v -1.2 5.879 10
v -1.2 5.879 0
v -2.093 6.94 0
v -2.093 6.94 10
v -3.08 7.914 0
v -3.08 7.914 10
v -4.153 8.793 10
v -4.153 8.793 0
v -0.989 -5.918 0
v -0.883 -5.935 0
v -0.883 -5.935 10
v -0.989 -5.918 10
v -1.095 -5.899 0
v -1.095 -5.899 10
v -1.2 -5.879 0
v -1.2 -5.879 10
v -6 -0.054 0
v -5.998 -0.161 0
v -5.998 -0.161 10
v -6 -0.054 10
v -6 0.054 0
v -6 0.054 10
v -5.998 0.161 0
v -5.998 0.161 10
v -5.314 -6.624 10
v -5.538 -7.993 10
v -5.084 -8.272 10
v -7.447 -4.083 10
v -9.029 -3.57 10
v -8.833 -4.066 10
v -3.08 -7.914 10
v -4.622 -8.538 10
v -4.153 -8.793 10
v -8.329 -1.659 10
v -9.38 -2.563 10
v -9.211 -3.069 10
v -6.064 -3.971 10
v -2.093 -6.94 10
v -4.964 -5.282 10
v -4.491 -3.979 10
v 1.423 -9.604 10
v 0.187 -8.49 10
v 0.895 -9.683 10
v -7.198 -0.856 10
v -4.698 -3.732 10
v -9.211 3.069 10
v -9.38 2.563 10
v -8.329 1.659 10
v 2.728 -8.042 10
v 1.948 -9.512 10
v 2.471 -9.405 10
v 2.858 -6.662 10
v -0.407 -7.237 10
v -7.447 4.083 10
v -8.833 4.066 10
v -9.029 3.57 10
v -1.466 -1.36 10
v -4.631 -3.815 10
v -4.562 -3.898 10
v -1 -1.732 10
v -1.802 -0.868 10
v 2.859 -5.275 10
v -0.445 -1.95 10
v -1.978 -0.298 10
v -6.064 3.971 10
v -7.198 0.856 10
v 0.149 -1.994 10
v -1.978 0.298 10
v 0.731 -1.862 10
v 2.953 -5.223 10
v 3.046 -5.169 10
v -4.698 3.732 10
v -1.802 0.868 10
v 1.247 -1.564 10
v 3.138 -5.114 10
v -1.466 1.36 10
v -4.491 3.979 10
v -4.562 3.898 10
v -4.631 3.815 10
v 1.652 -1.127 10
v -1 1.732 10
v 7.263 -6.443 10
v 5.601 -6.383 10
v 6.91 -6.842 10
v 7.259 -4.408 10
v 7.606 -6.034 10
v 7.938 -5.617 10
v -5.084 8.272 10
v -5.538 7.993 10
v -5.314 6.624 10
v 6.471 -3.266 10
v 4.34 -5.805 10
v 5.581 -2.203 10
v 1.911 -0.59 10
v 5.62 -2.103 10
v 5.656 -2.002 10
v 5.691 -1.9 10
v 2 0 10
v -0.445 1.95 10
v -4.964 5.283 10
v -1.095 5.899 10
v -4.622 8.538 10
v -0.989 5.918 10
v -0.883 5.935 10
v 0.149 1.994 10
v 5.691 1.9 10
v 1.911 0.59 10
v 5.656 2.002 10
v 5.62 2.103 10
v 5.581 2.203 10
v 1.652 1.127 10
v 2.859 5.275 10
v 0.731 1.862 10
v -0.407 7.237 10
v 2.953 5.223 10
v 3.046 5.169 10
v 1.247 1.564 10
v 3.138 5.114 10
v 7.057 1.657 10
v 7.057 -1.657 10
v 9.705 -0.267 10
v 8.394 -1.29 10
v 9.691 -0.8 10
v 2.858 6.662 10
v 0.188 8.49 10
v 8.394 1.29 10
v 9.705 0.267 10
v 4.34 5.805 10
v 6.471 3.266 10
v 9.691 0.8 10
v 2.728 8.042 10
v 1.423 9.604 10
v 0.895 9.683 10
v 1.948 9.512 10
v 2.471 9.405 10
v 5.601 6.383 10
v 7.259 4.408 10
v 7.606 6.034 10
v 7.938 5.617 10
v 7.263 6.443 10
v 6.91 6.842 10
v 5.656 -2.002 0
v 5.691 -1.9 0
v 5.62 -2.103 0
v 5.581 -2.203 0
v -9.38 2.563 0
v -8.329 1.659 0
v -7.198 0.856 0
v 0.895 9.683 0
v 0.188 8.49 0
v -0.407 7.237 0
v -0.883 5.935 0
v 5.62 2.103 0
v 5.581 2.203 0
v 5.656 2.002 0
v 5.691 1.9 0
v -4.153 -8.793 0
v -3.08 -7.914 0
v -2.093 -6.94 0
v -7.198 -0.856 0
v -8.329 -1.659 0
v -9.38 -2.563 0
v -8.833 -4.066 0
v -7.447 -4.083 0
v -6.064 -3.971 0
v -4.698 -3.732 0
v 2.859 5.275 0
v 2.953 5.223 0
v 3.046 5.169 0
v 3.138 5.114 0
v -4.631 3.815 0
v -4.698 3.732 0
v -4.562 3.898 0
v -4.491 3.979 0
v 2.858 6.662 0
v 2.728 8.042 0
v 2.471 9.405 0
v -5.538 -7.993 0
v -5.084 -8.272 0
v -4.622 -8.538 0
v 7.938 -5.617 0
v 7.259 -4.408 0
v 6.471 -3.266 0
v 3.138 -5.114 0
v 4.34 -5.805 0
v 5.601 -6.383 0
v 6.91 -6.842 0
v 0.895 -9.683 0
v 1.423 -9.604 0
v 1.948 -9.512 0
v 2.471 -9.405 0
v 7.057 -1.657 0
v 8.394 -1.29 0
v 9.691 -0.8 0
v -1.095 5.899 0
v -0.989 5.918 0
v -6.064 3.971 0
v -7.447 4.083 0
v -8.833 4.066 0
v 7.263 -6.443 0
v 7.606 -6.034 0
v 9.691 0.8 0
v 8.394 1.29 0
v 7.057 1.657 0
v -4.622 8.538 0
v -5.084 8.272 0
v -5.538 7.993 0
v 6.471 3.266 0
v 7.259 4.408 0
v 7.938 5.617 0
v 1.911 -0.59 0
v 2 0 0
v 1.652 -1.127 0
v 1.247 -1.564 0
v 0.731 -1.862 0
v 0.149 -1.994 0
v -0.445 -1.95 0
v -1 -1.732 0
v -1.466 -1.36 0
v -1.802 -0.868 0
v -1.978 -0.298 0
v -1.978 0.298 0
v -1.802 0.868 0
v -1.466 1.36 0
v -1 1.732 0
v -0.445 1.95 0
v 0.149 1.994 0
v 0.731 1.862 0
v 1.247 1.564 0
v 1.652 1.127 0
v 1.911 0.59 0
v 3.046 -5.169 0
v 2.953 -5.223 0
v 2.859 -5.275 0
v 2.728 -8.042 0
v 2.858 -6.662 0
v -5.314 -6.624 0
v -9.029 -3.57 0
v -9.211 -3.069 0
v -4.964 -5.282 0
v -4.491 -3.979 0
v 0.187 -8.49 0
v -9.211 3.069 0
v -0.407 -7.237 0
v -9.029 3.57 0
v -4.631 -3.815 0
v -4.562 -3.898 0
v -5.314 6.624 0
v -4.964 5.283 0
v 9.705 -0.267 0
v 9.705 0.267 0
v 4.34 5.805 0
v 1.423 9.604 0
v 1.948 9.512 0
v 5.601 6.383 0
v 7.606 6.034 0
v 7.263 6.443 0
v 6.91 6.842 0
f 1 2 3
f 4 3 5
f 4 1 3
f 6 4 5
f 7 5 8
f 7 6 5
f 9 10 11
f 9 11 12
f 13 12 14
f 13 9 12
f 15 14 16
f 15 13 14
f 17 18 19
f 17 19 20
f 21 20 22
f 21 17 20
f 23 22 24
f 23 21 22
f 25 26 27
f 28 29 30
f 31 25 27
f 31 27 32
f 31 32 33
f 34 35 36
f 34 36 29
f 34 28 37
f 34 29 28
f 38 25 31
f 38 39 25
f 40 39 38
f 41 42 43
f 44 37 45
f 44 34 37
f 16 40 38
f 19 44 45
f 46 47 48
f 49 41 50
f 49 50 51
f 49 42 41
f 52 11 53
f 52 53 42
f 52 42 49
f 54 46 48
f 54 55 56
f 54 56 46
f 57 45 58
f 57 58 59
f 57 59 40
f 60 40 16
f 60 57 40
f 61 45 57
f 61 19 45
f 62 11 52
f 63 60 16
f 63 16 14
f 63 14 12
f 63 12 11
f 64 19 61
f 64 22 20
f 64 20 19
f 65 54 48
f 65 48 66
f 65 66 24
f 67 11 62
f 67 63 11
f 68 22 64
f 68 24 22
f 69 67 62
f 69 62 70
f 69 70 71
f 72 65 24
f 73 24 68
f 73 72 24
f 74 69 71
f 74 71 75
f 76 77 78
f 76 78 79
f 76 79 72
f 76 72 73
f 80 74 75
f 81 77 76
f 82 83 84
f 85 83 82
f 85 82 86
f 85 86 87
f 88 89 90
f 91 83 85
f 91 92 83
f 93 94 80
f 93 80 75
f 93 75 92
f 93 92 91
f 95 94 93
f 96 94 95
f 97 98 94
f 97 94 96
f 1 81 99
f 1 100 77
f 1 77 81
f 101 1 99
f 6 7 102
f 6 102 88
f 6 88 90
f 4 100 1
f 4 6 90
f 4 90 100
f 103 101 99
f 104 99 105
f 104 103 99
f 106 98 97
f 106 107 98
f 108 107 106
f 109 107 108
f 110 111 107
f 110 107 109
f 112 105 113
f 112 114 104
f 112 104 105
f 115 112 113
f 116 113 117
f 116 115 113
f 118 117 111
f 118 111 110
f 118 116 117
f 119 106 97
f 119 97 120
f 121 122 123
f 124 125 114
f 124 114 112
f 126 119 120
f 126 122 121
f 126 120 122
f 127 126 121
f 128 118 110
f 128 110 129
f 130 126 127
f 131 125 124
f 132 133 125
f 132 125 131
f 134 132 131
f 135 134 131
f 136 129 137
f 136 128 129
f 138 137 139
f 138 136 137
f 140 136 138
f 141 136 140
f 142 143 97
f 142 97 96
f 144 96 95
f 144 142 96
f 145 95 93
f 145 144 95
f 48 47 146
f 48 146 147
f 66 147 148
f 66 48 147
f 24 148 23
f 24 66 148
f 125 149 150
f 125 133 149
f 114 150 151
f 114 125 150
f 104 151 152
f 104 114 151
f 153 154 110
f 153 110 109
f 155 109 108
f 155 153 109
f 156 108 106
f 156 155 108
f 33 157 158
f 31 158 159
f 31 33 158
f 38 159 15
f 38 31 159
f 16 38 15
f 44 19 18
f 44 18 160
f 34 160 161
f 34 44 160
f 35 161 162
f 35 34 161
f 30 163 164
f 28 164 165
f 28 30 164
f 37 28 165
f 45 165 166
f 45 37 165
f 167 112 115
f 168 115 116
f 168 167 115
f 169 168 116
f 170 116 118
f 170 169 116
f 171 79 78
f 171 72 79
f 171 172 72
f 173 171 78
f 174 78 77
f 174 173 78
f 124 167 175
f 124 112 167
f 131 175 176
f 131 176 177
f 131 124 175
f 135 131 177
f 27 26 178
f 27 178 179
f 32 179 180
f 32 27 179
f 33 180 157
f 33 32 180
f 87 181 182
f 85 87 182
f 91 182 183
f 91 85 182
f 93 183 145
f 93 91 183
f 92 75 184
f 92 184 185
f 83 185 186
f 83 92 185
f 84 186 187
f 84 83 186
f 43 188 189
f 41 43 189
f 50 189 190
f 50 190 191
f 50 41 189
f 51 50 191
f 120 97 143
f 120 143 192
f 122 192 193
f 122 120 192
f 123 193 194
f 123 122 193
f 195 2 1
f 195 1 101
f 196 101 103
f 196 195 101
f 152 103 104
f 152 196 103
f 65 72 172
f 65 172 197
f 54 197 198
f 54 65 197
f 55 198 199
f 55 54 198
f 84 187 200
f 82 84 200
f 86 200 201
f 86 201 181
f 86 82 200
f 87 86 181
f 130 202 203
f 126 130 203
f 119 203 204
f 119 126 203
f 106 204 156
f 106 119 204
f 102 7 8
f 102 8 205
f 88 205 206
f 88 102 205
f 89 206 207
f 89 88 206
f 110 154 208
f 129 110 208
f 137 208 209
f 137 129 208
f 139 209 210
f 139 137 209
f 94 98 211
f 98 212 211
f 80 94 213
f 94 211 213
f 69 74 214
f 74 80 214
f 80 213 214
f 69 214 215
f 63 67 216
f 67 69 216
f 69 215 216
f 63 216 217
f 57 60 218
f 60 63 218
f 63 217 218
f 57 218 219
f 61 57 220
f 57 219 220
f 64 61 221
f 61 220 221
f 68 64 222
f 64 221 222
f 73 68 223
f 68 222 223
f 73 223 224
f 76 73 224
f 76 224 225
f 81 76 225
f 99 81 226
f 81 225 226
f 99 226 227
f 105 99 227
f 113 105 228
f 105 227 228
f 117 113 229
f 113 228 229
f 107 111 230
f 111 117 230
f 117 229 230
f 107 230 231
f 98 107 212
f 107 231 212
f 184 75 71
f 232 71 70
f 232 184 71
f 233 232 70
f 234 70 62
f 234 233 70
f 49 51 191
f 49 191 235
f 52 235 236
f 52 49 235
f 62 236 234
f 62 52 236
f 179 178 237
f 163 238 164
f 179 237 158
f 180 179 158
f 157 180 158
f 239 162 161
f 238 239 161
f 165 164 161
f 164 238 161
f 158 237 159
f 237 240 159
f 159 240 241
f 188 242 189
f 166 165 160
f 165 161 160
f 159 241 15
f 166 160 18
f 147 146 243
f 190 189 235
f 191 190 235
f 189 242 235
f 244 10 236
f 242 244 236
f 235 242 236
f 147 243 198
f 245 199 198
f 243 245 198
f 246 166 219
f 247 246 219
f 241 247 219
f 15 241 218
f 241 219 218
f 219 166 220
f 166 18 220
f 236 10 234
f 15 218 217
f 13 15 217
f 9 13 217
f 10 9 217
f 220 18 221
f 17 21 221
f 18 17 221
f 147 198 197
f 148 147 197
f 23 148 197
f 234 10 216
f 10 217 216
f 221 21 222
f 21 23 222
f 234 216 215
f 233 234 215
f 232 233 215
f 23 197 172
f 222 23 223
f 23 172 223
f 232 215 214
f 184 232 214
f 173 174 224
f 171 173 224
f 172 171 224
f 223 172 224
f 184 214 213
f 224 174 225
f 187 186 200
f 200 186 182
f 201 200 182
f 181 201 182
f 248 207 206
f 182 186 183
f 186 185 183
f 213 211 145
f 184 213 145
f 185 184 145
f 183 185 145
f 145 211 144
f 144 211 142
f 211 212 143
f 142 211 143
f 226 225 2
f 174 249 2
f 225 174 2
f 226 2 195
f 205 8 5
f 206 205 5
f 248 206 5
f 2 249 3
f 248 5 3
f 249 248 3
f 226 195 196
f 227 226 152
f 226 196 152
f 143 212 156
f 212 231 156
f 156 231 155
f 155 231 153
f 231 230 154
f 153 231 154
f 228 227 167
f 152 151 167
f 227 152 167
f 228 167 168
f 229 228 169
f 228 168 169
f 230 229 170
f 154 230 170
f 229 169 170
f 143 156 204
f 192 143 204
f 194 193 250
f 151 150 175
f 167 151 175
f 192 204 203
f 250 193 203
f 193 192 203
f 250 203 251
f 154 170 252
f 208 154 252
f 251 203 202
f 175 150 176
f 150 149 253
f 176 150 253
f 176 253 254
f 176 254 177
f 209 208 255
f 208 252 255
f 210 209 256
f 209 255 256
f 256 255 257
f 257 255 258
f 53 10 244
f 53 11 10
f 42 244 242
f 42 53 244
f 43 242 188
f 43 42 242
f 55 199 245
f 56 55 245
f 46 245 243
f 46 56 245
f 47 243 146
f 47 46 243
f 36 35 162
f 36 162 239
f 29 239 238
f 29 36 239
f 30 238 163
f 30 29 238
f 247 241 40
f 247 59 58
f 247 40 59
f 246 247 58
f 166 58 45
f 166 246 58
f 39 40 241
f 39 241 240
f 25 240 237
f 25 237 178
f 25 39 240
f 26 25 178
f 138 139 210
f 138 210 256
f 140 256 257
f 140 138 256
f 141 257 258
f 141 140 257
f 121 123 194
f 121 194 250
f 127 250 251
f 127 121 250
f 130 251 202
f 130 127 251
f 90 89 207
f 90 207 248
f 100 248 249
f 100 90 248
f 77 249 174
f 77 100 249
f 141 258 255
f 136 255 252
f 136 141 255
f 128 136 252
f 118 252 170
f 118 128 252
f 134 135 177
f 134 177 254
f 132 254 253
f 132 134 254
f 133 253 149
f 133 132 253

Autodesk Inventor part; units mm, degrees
ref_plane "YZ Plane" through (0, 0, 0) normal (1, 0, 0) x (0, 1, 0)
ref_plane "XZ Plane" through (0, 0, 0) normal (0, 1, 0) x (-1, 0, 0)
ref_plane "XY Plane" through (0, 0, 0) normal (0, 0, 1) x (1, 0, 0)
sketch "Sketch1" plane through (0, 0, 0) normal (0, 0, 1) x (1, 0, 0)
  circle A0 centre (0, 0) radius 6
  circle A1 centre (0, 0) radius 2
  dimension "d0" = 12
  dimension "d1" = 4
extrude "Extrusion1" add sketch "Sketch1" along normal blind 10
sketch "Sketch3" plane through (0, 0, 10) normal (0, 0, 1) x (1, 0, 0)
  line L0 (0, 0) -> (25, 0) construction
  arc A0 (9.6912, 0.8) -> (5.6912, 1.9) centre (3.7521, -12.9741) ccw
  circle A1 centre (0, 0) radius 6 projected
  arc A2 (9.6912, -0.8) -> (9.6912, 0.8) centre (-10.2928, 0) ccw
  arc A3 (5.6912, -1.9) -> (9.6912, -0.8) centre (3.7521, 12.9741) ccw
  arc A4 (5.6912, -1.9) -> (5.6912, 1.9) centre (0, 0) ccw
  arc A5 (6.9097, 6.8422) -> (3.1384, 5.1137) centre (11.2139, -7.527) ccw
  arc A6 (7.9381, 5.6166) -> (6.9097, 6.8422) centre (-7.8847, -6.6161) ccw
  arc A7 (5.581, 2.2028) -> (7.9381, 5.6166) centre (-5.4653, 12.3506) ccw
  arc A8 (5.581, 2.2028) -> (3.1384, 5.1137) centre (0, 0) ccw
  arc A9 (0.895, 9.6829) -> (-0.8829, 5.9347) centre (13.4286, 1.4421) ccw
  arc A10 (2.4707, 9.4051) -> (0.895, 9.6829) centre (-1.7873, -10.1364) ccw
  arc A11 (2.8594, 5.2748) -> (2.4707, 9.4051) centre (-12.1255, 5.948) ccw
  arc A12 (2.8594, 5.2748) -> (-0.8829, 5.9347) centre (0, 0) ccw
  arc A13 (-5.5384, 7.9928) -> (-4.4911, 3.9787) centre (9.3599, 9.7365) ccw
  arc A14 (-4.1528, 8.7928) -> (-5.5384, 7.9928) centre (5.1464, -8.9138) ccw
  arc A15 (-1.2002, 5.8787) -> (-4.1528, 8.7928) centre (-13.112, -3.2377) ccw
  arc A16 (-1.2002, 5.8787) -> (-4.4911, 3.9787) centre (0, 0) ccw
  arc A17 (-9.3804, 2.5628) -> (-5.9978, 0.1611) centre (0.9116, 13.475) ccw
  arc A18 (-8.8332, 4.0663) -> (-9.3804, 2.5628) centre (9.672, -3.5203) ccw
  arc A19 (-4.6982, 3.7319) -> (-8.8332, 4.0663) centre (-7.9632, -10.9084) ccw
  arc A20 (-4.6982, 3.7319) -> (-5.9978, 0.1611) centre (0, 0) ccw
  arc A21 (-8.8332, -4.0663) -> (-4.6982, -3.7319) centre (-7.9632, 10.9084) ccw
  arc A22 (-9.3804, -2.5628) -> (-8.8332, -4.0663) centre (9.672, 3.5203) ccw
  arc A23 (-5.9978, -0.1611) -> (-9.3804, -2.5628) centre (0.9116, -13.475) ccw
  arc A24 (-5.9978, -0.1611) -> (-4.6982, -3.7319) centre (0, 0) ccw
  arc A25 (-4.1528, -8.7928) -> (-1.2002, -5.8787) centre (-13.112, 3.2377) ccw
  arc A26 (-5.5384, -7.9928) -> (-4.1528, -8.7928) centre (5.1464, 8.9138) ccw
  arc A27 (-4.4911, -3.9787) -> (-5.5384, -7.9928) centre (9.3599, -9.7365) ccw
  arc A28 (-4.4911, -3.9787) -> (-1.2002, -5.8787) centre (0, 0) ccw
  arc A29 (2.4707, -9.4051) -> (2.8594, -5.2748) centre (-12.1255, -5.948) ccw
  arc A30 (0.895, -9.6829) -> (2.4707, -9.4051) centre (-1.7873, 10.1364) ccw
  arc A31 (-0.8829, -5.9347) -> (0.895, -9.6829) centre (13.4286, -1.4421) ccw
  arc A32 (-0.8829, -5.9347) -> (2.8594, -5.2748) centre (0, 0) ccw
  arc A33 (7.9381, -5.6166) -> (5.581, -2.2028) centre (-5.4653, -12.3506) ccw
  arc A34 (6.9097, -6.8422) -> (7.9381, -5.6166) centre (-7.8847, 6.6161) ccw
  arc A35 (3.1384, -5.1137) -> (6.9097, -6.8422) centre (11.2139, 7.527) ccw
  arc A36 (3.1384, -5.1137) -> (5.581, -2.2028) centre (0, 0) ccw
  point P0 (9.7072, 0)
  point P1 (7.4362, 6.2397)
  point P2 (1.6856, 9.5598)
  point P3 (-4.8536, 8.4067)
  point P4 (-9.1218, 3.3201)
  point P5 (-9.1218, -3.3201)
  point P6 (-4.8536, -8.4067)
  point P7 (1.6856, -9.5598)
  point P8 (7.4362, -6.2397)
  dimension "d8" = 25
  dimension "d9" = 15
  dimension "d10" = 1.6
  dimension "d11" = 20
  dimension "d12" = 4
  dimension "d13" = 1.1
  dimension "d14" = 15
  dimension "d15" = 1.1
  dimension "d16" = 4
  dimension "d19" = 360
extrude "Extrusion3" add sketch "Sketch3" against normal blind 10 contours A2 A3 A1 A0 | A1 A5 A6 A7 | A33 A34 A35 A1 | A1 A9 A10 A11 | A29 A30 A31 A1 | A1 A13 A14 A15 | A25 A26 A27 A1 | A1 A17 A18 A19 | A21 A22 A23 A1
properties part number "GA002" material "ABS Plastic"
